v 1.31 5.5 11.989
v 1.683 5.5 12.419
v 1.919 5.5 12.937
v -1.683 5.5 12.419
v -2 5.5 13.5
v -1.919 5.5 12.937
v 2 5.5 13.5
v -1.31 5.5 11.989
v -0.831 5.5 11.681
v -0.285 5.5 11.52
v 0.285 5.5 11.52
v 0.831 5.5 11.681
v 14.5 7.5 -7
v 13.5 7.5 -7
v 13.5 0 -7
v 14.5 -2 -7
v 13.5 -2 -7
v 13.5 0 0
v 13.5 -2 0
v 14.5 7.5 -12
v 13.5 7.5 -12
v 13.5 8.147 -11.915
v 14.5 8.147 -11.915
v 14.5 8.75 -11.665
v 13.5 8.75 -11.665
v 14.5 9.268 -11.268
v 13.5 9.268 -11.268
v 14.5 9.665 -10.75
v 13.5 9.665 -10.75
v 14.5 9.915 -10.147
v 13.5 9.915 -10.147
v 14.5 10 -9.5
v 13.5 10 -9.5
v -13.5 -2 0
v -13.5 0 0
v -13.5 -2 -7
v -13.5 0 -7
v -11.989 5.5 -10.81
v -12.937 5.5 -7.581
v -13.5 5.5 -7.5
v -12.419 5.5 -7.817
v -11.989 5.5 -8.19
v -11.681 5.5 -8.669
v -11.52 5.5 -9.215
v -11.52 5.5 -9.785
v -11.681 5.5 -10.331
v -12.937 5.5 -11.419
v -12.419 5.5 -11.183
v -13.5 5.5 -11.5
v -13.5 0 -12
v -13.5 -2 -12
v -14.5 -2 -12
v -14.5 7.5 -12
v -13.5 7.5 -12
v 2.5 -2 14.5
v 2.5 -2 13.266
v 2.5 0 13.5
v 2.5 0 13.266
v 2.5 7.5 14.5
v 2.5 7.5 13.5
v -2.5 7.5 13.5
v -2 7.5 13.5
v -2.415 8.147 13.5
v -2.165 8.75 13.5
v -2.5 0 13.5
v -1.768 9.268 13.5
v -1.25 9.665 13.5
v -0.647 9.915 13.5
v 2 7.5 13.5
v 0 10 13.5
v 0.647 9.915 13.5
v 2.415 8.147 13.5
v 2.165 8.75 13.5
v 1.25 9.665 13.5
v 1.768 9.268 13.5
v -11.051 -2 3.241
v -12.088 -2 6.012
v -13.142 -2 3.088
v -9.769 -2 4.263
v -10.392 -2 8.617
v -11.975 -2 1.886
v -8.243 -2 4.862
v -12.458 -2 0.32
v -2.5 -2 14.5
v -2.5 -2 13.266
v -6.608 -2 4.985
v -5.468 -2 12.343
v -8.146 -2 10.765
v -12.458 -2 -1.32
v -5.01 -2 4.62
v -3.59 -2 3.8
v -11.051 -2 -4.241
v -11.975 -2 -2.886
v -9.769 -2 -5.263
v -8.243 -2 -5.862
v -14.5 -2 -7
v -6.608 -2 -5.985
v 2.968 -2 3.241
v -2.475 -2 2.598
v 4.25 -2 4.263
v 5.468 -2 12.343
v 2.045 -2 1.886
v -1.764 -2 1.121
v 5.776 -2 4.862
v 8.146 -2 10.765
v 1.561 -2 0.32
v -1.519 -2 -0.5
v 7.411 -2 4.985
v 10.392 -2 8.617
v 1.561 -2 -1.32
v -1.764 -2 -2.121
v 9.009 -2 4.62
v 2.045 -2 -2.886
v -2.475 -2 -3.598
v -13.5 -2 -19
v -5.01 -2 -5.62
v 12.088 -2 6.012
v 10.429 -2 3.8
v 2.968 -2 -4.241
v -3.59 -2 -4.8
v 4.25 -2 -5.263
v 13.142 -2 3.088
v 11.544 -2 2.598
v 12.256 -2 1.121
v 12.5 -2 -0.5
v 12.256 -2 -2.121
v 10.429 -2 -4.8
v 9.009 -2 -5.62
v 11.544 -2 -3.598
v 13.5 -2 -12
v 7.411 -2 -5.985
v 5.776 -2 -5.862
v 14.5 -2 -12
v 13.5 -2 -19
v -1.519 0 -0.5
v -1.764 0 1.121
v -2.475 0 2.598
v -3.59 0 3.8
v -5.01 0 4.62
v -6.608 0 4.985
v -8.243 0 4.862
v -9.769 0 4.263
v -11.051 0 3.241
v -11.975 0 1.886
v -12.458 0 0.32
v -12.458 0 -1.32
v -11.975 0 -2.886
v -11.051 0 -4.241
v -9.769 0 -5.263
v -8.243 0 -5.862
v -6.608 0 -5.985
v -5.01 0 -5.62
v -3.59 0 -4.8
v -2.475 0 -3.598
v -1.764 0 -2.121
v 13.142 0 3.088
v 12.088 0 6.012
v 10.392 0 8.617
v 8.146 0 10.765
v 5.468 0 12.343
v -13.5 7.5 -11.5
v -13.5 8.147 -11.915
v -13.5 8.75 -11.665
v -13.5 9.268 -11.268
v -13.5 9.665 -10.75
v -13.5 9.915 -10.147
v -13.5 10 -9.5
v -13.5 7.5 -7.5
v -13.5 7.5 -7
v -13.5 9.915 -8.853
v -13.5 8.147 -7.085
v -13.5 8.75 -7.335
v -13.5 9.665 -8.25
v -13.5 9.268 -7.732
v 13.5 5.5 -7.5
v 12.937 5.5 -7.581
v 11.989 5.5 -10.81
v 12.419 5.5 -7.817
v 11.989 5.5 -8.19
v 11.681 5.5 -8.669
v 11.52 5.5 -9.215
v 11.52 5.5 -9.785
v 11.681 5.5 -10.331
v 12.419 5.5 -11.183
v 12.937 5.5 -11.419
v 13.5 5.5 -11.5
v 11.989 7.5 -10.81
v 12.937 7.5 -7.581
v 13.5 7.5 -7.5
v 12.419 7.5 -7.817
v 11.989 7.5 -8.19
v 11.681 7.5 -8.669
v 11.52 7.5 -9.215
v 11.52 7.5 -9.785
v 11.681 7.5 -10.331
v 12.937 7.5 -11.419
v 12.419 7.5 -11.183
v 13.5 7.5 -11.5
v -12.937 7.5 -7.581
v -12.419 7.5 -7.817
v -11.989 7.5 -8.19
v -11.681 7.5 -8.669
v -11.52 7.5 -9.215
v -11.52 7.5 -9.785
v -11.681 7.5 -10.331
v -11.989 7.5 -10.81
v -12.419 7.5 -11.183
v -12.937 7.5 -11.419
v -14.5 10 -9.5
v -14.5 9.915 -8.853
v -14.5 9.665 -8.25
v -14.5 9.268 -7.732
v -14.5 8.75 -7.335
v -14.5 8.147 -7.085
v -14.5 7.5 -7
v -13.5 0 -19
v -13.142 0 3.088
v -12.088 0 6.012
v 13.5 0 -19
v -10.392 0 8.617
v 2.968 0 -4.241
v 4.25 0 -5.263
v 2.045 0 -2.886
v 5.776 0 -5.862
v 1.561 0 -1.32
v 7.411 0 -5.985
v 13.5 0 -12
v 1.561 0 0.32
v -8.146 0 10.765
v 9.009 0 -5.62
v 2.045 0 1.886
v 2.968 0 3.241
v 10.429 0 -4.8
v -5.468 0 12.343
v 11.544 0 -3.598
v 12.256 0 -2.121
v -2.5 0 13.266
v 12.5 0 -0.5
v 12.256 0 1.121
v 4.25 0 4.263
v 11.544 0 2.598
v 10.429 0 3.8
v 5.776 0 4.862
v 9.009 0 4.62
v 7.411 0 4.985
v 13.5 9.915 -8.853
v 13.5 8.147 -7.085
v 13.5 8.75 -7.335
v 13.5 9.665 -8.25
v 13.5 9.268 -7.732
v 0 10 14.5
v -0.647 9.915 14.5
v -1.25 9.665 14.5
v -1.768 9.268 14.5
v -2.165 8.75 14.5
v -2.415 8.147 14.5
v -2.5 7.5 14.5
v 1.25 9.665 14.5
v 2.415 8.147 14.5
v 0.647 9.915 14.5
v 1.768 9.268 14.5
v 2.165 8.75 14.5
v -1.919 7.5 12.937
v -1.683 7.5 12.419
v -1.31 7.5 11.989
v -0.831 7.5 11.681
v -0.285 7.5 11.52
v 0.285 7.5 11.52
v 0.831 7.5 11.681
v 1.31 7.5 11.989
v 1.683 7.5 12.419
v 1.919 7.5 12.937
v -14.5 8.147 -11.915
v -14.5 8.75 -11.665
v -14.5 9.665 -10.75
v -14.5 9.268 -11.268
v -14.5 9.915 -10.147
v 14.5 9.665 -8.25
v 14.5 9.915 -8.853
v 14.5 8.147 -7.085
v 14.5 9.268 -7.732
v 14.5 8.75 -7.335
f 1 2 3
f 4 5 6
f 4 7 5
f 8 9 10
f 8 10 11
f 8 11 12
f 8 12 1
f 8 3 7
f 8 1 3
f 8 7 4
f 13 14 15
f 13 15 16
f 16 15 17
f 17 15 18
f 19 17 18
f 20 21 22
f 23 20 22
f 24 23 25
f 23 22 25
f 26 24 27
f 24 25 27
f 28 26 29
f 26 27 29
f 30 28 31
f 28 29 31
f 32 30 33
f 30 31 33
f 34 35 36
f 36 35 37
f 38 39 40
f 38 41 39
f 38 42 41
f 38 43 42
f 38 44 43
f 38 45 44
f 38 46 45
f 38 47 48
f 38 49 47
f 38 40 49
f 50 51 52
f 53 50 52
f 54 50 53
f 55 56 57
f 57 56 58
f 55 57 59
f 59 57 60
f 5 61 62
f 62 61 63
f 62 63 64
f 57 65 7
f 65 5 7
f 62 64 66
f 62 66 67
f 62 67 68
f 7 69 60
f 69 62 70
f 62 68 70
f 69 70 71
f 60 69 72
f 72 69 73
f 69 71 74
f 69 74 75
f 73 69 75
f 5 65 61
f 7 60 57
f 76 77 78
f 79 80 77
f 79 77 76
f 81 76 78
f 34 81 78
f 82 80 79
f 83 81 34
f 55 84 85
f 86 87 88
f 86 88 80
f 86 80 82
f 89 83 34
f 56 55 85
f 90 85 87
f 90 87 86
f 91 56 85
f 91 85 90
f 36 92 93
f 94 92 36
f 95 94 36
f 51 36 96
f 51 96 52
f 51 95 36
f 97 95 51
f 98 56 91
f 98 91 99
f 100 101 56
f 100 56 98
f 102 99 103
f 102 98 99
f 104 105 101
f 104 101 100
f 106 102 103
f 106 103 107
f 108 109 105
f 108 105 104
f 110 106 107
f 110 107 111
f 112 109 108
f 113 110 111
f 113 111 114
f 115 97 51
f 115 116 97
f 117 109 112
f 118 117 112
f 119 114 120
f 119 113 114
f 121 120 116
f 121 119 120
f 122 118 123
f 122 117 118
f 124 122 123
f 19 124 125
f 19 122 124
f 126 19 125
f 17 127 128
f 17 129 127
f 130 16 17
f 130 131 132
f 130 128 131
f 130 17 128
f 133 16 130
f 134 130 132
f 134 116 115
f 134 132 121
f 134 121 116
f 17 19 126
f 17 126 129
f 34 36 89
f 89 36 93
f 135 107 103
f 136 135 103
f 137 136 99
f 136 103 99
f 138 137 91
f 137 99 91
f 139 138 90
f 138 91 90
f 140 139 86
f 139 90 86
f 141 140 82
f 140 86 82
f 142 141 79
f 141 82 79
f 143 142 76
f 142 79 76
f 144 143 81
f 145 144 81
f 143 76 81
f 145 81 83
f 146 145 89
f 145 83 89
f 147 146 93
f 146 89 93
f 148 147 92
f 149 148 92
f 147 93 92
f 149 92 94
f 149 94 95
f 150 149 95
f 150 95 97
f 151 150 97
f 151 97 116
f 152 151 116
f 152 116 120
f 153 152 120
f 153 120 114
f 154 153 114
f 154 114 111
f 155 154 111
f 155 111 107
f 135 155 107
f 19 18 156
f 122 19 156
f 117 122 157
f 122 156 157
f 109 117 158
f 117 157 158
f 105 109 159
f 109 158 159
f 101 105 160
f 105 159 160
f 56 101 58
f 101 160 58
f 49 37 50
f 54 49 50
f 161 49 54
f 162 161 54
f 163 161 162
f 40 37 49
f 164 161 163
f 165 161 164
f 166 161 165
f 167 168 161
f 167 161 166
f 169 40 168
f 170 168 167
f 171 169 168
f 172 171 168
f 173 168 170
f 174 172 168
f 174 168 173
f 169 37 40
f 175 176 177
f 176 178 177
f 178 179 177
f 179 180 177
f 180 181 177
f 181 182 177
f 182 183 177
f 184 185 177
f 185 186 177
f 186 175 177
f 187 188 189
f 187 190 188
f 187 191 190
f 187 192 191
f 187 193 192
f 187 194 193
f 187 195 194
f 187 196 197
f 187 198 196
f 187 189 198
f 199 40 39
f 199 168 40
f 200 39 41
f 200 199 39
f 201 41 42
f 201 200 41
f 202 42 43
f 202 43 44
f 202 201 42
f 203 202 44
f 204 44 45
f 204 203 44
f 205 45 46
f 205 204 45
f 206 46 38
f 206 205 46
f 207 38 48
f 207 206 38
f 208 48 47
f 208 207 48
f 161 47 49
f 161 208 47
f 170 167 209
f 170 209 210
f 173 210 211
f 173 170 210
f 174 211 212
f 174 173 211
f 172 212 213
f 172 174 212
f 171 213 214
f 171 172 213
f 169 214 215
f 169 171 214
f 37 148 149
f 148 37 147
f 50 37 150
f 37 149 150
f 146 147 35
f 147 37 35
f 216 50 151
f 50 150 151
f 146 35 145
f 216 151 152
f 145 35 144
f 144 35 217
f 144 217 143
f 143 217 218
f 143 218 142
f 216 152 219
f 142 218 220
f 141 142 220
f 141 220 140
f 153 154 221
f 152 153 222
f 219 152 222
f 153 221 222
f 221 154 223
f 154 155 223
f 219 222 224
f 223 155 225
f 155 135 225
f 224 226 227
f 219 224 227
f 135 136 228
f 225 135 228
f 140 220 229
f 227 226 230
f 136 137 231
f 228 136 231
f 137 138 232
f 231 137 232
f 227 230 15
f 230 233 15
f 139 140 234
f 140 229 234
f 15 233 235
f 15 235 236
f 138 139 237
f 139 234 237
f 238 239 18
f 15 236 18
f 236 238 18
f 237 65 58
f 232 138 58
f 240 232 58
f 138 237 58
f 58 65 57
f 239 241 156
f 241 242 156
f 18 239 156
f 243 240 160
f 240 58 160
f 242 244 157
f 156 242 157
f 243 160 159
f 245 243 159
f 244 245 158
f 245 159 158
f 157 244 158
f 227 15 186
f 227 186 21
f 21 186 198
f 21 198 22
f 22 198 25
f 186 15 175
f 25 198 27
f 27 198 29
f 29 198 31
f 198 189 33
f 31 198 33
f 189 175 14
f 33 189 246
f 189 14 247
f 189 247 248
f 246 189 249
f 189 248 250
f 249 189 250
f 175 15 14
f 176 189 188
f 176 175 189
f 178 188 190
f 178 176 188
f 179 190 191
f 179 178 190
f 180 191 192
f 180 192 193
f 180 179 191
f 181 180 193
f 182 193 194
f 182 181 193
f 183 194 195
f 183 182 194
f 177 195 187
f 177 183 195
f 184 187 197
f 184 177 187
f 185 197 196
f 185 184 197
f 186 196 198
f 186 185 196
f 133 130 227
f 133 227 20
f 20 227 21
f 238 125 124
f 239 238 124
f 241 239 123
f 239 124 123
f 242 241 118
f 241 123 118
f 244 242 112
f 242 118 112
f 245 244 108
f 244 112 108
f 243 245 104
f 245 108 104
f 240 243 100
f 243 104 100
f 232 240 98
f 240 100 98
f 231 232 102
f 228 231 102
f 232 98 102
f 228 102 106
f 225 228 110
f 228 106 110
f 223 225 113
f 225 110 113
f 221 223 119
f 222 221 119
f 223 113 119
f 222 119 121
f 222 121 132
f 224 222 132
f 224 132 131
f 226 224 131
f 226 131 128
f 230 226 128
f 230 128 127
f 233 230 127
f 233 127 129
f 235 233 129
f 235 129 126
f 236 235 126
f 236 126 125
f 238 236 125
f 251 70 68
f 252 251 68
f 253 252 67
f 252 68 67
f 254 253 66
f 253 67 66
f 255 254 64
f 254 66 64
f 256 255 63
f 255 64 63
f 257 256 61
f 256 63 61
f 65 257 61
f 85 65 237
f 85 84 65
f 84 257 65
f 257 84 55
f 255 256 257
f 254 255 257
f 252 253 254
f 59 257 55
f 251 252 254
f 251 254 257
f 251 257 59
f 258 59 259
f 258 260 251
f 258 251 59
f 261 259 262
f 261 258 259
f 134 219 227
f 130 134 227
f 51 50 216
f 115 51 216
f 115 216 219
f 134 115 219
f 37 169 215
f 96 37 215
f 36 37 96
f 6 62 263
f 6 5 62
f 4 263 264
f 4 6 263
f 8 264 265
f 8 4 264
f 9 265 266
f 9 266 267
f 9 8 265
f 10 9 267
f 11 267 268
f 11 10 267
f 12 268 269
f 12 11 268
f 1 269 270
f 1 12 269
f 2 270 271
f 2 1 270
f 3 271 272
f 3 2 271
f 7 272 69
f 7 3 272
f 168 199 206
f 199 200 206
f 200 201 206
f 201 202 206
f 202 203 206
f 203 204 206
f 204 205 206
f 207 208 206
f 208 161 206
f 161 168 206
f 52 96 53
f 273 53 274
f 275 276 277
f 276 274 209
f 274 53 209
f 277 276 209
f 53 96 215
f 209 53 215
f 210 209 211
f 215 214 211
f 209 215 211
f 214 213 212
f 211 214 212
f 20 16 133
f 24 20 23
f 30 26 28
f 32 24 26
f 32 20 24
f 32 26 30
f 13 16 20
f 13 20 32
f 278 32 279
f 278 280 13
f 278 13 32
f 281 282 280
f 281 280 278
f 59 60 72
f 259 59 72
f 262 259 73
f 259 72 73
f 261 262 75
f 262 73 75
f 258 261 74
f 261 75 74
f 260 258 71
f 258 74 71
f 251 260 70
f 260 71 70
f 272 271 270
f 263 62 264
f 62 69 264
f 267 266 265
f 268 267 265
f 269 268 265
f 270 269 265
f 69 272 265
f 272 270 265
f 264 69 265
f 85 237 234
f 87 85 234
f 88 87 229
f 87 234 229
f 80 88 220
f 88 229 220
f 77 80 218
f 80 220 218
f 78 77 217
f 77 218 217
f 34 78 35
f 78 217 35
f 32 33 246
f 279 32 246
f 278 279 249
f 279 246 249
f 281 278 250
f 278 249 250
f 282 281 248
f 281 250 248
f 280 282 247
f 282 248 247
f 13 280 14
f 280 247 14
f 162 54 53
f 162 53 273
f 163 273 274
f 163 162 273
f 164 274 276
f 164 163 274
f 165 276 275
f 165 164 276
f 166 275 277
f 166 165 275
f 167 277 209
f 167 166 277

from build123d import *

# Parameters (mm, degrees)
F1_DEPTH  = 2
F4_DEPTH  = 1
F6_DEPTH  = 2
F9_DEPTH  = 1
F12_DEPTH = 1
F13_W     = 2
F13_H     = 2
F14_ANGLE = 180
F15_W     = 2
F15_H     = 2
F16_ANGLE = 180
F17_W     = 2
F17_H     = 2
F18_ANGLE = 180
F19_R     = 5.5
F20_DEPTH = 5


# Not quite as in the source:
# - a feature names something its author has since deleted; it is built from what else it names


with BuildPart() as f1:
    # F0 (on Front) → F1 (new body)
    with BuildSketch(Plane.XZ):
        with BuildLine():
            ThreePointArc((-13.5, 0), (0, -13.5), (13.5, 0))
            ThreePointArc((13.5, 0), (0, 13.5), (-13.5, 0))
        make_face()
        with BuildLine():
            Line((13.5, -19), (13.5, 0))
            ThreePointArc((13.5, 0), (0, -13.5), (-13.5, 0))
            Line((-13.5, 0), (-13.5, -19))
            Line((-13.5, -19), (13.5, -19))
        make_face()
    extrude(amount=F1_DEPTH)

    # F3 (on offset) → F4 (join)
    with BuildSketch(Plane.XY.offset(13.5)):
        with BuildLine():
            Line((-2.5, 7.5), (-2.5, -2))
            Line((-2.5, -2), (2.5, -2))
            Line((2.5, -2), (2.5, 7.5))
            ThreePointArc((2.5, 7.5), (1.767766953, 9.267766953), (0, 10))
            ThreePointArc((0, 10), (-1.767766953, 9.267766953), (-2.5, 7.5))
        make_face()
    extrude(amount=F4_DEPTH)

    # F5 (on face) → F6 (join)
    with BuildSketch(Plane.XZ.offset(2)):
        with BuildLine():
            Line((-2.5, 13.5), (-2.5, 13.2664991614))
            ThreePointArc((-2.5, 13.2664991614), (-1.2554404249, 13.4414980318), (0, 13.5))
            Line((0, 13.5), (-2.5, 13.5))
        make_face()
        with BuildLine():
            ThreePointArc((0, 13.5), (1.2554404249, 13.4414980318), (2.5, 13.2664991614))
            Line((2.5, 13.2664991614), (2.5, 13.5))
            Line((2.5, 13.5), (0, 13.5))
        make_face()
    extrude(amount=-F6_DEPTH)

    # F8 (on offset) → F9 (join)
    with BuildSketch(Plane.YZ.offset(13.5)):
        with BuildLine():
            Line((7.5, -7), (-2, -7))
            Line((-2, -7), (-2, -12))
            Line((-2, -12), (7.5, -12))
            ThreePointArc((7.5, -12), (9.267766953, -11.267766953), (10, -9.5))
            ThreePointArc((10, -9.5), (9.267766953, -7.732233047), (7.5, -7))
        make_face()
    extrude(amount=F9_DEPTH)

    # F11 (on offset) → F12 (join)
    with BuildSketch(Plane.YZ.offset(-13.5)):
        with BuildLine():
            Line((7.5, -7), (-2, -7))
            Line((-2, -7), (-2, -12))
            Line((-2, -12), (7.5, -12))
            ThreePointArc((7.5, -12), (9.267766953, -11.267766953), (10, -9.5))
            ThreePointArc((10, -9.5), (9.267766953, -7.732233047), (7.5, -7))
        make_face()
    extrude(amount=-F12_DEPTH)

    # F13 (on face) → F14 (revolve)
    with BuildSketch(Plane(origin=(0, 0, 13.5), x_dir=(1, 0, 0), z_dir=(0, 0, -1))):
        with Locations((-1, -6.5)):
            Rectangle(F13_W, F13_H)
    revolve(axis=Axis((0, 6.5, 13.5), (0, -1, 0)), revolution_arc=F14_ANGLE)

    # F15 (on face) → F16 (revolve)
    with BuildSketch(Plane(origin=(13.5, 0, 0), x_dir=(0, -1, 0), z_dir=(-1, 0, 0))):
        with Locations((-6.5, -8.5)):
            Rectangle(F15_W, F15_H)
    revolve(axis=Axis((13.5, 6.5, -9.5), (0, -1, 0)), revolution_arc=F16_ANGLE)

    # F17 (on face) → F18 (revolve)
    with BuildSketch(Plane.YZ.offset(-13.5)):
        with Locations((6.5, -8.5)):
            Rectangle(F17_W, F17_H)
    revolve(axis=Axis((-13.5, 6.5, -9.5), (0, 1, 0)), revolution_arc=F18_ANGLE)

    # F19 (on face) → F20 (cut)
    with BuildSketch(Plane.XZ.offset(2)):
        with Locations((-7.0192593016, -0.5)):
            Circle(F19_R)
        with Locations((7, -0.5)):
            Circle(F19_R)
    extrude(amount=-F20_DEPTH, mode=Mode.SUBTRACT)


solid = f1.part
